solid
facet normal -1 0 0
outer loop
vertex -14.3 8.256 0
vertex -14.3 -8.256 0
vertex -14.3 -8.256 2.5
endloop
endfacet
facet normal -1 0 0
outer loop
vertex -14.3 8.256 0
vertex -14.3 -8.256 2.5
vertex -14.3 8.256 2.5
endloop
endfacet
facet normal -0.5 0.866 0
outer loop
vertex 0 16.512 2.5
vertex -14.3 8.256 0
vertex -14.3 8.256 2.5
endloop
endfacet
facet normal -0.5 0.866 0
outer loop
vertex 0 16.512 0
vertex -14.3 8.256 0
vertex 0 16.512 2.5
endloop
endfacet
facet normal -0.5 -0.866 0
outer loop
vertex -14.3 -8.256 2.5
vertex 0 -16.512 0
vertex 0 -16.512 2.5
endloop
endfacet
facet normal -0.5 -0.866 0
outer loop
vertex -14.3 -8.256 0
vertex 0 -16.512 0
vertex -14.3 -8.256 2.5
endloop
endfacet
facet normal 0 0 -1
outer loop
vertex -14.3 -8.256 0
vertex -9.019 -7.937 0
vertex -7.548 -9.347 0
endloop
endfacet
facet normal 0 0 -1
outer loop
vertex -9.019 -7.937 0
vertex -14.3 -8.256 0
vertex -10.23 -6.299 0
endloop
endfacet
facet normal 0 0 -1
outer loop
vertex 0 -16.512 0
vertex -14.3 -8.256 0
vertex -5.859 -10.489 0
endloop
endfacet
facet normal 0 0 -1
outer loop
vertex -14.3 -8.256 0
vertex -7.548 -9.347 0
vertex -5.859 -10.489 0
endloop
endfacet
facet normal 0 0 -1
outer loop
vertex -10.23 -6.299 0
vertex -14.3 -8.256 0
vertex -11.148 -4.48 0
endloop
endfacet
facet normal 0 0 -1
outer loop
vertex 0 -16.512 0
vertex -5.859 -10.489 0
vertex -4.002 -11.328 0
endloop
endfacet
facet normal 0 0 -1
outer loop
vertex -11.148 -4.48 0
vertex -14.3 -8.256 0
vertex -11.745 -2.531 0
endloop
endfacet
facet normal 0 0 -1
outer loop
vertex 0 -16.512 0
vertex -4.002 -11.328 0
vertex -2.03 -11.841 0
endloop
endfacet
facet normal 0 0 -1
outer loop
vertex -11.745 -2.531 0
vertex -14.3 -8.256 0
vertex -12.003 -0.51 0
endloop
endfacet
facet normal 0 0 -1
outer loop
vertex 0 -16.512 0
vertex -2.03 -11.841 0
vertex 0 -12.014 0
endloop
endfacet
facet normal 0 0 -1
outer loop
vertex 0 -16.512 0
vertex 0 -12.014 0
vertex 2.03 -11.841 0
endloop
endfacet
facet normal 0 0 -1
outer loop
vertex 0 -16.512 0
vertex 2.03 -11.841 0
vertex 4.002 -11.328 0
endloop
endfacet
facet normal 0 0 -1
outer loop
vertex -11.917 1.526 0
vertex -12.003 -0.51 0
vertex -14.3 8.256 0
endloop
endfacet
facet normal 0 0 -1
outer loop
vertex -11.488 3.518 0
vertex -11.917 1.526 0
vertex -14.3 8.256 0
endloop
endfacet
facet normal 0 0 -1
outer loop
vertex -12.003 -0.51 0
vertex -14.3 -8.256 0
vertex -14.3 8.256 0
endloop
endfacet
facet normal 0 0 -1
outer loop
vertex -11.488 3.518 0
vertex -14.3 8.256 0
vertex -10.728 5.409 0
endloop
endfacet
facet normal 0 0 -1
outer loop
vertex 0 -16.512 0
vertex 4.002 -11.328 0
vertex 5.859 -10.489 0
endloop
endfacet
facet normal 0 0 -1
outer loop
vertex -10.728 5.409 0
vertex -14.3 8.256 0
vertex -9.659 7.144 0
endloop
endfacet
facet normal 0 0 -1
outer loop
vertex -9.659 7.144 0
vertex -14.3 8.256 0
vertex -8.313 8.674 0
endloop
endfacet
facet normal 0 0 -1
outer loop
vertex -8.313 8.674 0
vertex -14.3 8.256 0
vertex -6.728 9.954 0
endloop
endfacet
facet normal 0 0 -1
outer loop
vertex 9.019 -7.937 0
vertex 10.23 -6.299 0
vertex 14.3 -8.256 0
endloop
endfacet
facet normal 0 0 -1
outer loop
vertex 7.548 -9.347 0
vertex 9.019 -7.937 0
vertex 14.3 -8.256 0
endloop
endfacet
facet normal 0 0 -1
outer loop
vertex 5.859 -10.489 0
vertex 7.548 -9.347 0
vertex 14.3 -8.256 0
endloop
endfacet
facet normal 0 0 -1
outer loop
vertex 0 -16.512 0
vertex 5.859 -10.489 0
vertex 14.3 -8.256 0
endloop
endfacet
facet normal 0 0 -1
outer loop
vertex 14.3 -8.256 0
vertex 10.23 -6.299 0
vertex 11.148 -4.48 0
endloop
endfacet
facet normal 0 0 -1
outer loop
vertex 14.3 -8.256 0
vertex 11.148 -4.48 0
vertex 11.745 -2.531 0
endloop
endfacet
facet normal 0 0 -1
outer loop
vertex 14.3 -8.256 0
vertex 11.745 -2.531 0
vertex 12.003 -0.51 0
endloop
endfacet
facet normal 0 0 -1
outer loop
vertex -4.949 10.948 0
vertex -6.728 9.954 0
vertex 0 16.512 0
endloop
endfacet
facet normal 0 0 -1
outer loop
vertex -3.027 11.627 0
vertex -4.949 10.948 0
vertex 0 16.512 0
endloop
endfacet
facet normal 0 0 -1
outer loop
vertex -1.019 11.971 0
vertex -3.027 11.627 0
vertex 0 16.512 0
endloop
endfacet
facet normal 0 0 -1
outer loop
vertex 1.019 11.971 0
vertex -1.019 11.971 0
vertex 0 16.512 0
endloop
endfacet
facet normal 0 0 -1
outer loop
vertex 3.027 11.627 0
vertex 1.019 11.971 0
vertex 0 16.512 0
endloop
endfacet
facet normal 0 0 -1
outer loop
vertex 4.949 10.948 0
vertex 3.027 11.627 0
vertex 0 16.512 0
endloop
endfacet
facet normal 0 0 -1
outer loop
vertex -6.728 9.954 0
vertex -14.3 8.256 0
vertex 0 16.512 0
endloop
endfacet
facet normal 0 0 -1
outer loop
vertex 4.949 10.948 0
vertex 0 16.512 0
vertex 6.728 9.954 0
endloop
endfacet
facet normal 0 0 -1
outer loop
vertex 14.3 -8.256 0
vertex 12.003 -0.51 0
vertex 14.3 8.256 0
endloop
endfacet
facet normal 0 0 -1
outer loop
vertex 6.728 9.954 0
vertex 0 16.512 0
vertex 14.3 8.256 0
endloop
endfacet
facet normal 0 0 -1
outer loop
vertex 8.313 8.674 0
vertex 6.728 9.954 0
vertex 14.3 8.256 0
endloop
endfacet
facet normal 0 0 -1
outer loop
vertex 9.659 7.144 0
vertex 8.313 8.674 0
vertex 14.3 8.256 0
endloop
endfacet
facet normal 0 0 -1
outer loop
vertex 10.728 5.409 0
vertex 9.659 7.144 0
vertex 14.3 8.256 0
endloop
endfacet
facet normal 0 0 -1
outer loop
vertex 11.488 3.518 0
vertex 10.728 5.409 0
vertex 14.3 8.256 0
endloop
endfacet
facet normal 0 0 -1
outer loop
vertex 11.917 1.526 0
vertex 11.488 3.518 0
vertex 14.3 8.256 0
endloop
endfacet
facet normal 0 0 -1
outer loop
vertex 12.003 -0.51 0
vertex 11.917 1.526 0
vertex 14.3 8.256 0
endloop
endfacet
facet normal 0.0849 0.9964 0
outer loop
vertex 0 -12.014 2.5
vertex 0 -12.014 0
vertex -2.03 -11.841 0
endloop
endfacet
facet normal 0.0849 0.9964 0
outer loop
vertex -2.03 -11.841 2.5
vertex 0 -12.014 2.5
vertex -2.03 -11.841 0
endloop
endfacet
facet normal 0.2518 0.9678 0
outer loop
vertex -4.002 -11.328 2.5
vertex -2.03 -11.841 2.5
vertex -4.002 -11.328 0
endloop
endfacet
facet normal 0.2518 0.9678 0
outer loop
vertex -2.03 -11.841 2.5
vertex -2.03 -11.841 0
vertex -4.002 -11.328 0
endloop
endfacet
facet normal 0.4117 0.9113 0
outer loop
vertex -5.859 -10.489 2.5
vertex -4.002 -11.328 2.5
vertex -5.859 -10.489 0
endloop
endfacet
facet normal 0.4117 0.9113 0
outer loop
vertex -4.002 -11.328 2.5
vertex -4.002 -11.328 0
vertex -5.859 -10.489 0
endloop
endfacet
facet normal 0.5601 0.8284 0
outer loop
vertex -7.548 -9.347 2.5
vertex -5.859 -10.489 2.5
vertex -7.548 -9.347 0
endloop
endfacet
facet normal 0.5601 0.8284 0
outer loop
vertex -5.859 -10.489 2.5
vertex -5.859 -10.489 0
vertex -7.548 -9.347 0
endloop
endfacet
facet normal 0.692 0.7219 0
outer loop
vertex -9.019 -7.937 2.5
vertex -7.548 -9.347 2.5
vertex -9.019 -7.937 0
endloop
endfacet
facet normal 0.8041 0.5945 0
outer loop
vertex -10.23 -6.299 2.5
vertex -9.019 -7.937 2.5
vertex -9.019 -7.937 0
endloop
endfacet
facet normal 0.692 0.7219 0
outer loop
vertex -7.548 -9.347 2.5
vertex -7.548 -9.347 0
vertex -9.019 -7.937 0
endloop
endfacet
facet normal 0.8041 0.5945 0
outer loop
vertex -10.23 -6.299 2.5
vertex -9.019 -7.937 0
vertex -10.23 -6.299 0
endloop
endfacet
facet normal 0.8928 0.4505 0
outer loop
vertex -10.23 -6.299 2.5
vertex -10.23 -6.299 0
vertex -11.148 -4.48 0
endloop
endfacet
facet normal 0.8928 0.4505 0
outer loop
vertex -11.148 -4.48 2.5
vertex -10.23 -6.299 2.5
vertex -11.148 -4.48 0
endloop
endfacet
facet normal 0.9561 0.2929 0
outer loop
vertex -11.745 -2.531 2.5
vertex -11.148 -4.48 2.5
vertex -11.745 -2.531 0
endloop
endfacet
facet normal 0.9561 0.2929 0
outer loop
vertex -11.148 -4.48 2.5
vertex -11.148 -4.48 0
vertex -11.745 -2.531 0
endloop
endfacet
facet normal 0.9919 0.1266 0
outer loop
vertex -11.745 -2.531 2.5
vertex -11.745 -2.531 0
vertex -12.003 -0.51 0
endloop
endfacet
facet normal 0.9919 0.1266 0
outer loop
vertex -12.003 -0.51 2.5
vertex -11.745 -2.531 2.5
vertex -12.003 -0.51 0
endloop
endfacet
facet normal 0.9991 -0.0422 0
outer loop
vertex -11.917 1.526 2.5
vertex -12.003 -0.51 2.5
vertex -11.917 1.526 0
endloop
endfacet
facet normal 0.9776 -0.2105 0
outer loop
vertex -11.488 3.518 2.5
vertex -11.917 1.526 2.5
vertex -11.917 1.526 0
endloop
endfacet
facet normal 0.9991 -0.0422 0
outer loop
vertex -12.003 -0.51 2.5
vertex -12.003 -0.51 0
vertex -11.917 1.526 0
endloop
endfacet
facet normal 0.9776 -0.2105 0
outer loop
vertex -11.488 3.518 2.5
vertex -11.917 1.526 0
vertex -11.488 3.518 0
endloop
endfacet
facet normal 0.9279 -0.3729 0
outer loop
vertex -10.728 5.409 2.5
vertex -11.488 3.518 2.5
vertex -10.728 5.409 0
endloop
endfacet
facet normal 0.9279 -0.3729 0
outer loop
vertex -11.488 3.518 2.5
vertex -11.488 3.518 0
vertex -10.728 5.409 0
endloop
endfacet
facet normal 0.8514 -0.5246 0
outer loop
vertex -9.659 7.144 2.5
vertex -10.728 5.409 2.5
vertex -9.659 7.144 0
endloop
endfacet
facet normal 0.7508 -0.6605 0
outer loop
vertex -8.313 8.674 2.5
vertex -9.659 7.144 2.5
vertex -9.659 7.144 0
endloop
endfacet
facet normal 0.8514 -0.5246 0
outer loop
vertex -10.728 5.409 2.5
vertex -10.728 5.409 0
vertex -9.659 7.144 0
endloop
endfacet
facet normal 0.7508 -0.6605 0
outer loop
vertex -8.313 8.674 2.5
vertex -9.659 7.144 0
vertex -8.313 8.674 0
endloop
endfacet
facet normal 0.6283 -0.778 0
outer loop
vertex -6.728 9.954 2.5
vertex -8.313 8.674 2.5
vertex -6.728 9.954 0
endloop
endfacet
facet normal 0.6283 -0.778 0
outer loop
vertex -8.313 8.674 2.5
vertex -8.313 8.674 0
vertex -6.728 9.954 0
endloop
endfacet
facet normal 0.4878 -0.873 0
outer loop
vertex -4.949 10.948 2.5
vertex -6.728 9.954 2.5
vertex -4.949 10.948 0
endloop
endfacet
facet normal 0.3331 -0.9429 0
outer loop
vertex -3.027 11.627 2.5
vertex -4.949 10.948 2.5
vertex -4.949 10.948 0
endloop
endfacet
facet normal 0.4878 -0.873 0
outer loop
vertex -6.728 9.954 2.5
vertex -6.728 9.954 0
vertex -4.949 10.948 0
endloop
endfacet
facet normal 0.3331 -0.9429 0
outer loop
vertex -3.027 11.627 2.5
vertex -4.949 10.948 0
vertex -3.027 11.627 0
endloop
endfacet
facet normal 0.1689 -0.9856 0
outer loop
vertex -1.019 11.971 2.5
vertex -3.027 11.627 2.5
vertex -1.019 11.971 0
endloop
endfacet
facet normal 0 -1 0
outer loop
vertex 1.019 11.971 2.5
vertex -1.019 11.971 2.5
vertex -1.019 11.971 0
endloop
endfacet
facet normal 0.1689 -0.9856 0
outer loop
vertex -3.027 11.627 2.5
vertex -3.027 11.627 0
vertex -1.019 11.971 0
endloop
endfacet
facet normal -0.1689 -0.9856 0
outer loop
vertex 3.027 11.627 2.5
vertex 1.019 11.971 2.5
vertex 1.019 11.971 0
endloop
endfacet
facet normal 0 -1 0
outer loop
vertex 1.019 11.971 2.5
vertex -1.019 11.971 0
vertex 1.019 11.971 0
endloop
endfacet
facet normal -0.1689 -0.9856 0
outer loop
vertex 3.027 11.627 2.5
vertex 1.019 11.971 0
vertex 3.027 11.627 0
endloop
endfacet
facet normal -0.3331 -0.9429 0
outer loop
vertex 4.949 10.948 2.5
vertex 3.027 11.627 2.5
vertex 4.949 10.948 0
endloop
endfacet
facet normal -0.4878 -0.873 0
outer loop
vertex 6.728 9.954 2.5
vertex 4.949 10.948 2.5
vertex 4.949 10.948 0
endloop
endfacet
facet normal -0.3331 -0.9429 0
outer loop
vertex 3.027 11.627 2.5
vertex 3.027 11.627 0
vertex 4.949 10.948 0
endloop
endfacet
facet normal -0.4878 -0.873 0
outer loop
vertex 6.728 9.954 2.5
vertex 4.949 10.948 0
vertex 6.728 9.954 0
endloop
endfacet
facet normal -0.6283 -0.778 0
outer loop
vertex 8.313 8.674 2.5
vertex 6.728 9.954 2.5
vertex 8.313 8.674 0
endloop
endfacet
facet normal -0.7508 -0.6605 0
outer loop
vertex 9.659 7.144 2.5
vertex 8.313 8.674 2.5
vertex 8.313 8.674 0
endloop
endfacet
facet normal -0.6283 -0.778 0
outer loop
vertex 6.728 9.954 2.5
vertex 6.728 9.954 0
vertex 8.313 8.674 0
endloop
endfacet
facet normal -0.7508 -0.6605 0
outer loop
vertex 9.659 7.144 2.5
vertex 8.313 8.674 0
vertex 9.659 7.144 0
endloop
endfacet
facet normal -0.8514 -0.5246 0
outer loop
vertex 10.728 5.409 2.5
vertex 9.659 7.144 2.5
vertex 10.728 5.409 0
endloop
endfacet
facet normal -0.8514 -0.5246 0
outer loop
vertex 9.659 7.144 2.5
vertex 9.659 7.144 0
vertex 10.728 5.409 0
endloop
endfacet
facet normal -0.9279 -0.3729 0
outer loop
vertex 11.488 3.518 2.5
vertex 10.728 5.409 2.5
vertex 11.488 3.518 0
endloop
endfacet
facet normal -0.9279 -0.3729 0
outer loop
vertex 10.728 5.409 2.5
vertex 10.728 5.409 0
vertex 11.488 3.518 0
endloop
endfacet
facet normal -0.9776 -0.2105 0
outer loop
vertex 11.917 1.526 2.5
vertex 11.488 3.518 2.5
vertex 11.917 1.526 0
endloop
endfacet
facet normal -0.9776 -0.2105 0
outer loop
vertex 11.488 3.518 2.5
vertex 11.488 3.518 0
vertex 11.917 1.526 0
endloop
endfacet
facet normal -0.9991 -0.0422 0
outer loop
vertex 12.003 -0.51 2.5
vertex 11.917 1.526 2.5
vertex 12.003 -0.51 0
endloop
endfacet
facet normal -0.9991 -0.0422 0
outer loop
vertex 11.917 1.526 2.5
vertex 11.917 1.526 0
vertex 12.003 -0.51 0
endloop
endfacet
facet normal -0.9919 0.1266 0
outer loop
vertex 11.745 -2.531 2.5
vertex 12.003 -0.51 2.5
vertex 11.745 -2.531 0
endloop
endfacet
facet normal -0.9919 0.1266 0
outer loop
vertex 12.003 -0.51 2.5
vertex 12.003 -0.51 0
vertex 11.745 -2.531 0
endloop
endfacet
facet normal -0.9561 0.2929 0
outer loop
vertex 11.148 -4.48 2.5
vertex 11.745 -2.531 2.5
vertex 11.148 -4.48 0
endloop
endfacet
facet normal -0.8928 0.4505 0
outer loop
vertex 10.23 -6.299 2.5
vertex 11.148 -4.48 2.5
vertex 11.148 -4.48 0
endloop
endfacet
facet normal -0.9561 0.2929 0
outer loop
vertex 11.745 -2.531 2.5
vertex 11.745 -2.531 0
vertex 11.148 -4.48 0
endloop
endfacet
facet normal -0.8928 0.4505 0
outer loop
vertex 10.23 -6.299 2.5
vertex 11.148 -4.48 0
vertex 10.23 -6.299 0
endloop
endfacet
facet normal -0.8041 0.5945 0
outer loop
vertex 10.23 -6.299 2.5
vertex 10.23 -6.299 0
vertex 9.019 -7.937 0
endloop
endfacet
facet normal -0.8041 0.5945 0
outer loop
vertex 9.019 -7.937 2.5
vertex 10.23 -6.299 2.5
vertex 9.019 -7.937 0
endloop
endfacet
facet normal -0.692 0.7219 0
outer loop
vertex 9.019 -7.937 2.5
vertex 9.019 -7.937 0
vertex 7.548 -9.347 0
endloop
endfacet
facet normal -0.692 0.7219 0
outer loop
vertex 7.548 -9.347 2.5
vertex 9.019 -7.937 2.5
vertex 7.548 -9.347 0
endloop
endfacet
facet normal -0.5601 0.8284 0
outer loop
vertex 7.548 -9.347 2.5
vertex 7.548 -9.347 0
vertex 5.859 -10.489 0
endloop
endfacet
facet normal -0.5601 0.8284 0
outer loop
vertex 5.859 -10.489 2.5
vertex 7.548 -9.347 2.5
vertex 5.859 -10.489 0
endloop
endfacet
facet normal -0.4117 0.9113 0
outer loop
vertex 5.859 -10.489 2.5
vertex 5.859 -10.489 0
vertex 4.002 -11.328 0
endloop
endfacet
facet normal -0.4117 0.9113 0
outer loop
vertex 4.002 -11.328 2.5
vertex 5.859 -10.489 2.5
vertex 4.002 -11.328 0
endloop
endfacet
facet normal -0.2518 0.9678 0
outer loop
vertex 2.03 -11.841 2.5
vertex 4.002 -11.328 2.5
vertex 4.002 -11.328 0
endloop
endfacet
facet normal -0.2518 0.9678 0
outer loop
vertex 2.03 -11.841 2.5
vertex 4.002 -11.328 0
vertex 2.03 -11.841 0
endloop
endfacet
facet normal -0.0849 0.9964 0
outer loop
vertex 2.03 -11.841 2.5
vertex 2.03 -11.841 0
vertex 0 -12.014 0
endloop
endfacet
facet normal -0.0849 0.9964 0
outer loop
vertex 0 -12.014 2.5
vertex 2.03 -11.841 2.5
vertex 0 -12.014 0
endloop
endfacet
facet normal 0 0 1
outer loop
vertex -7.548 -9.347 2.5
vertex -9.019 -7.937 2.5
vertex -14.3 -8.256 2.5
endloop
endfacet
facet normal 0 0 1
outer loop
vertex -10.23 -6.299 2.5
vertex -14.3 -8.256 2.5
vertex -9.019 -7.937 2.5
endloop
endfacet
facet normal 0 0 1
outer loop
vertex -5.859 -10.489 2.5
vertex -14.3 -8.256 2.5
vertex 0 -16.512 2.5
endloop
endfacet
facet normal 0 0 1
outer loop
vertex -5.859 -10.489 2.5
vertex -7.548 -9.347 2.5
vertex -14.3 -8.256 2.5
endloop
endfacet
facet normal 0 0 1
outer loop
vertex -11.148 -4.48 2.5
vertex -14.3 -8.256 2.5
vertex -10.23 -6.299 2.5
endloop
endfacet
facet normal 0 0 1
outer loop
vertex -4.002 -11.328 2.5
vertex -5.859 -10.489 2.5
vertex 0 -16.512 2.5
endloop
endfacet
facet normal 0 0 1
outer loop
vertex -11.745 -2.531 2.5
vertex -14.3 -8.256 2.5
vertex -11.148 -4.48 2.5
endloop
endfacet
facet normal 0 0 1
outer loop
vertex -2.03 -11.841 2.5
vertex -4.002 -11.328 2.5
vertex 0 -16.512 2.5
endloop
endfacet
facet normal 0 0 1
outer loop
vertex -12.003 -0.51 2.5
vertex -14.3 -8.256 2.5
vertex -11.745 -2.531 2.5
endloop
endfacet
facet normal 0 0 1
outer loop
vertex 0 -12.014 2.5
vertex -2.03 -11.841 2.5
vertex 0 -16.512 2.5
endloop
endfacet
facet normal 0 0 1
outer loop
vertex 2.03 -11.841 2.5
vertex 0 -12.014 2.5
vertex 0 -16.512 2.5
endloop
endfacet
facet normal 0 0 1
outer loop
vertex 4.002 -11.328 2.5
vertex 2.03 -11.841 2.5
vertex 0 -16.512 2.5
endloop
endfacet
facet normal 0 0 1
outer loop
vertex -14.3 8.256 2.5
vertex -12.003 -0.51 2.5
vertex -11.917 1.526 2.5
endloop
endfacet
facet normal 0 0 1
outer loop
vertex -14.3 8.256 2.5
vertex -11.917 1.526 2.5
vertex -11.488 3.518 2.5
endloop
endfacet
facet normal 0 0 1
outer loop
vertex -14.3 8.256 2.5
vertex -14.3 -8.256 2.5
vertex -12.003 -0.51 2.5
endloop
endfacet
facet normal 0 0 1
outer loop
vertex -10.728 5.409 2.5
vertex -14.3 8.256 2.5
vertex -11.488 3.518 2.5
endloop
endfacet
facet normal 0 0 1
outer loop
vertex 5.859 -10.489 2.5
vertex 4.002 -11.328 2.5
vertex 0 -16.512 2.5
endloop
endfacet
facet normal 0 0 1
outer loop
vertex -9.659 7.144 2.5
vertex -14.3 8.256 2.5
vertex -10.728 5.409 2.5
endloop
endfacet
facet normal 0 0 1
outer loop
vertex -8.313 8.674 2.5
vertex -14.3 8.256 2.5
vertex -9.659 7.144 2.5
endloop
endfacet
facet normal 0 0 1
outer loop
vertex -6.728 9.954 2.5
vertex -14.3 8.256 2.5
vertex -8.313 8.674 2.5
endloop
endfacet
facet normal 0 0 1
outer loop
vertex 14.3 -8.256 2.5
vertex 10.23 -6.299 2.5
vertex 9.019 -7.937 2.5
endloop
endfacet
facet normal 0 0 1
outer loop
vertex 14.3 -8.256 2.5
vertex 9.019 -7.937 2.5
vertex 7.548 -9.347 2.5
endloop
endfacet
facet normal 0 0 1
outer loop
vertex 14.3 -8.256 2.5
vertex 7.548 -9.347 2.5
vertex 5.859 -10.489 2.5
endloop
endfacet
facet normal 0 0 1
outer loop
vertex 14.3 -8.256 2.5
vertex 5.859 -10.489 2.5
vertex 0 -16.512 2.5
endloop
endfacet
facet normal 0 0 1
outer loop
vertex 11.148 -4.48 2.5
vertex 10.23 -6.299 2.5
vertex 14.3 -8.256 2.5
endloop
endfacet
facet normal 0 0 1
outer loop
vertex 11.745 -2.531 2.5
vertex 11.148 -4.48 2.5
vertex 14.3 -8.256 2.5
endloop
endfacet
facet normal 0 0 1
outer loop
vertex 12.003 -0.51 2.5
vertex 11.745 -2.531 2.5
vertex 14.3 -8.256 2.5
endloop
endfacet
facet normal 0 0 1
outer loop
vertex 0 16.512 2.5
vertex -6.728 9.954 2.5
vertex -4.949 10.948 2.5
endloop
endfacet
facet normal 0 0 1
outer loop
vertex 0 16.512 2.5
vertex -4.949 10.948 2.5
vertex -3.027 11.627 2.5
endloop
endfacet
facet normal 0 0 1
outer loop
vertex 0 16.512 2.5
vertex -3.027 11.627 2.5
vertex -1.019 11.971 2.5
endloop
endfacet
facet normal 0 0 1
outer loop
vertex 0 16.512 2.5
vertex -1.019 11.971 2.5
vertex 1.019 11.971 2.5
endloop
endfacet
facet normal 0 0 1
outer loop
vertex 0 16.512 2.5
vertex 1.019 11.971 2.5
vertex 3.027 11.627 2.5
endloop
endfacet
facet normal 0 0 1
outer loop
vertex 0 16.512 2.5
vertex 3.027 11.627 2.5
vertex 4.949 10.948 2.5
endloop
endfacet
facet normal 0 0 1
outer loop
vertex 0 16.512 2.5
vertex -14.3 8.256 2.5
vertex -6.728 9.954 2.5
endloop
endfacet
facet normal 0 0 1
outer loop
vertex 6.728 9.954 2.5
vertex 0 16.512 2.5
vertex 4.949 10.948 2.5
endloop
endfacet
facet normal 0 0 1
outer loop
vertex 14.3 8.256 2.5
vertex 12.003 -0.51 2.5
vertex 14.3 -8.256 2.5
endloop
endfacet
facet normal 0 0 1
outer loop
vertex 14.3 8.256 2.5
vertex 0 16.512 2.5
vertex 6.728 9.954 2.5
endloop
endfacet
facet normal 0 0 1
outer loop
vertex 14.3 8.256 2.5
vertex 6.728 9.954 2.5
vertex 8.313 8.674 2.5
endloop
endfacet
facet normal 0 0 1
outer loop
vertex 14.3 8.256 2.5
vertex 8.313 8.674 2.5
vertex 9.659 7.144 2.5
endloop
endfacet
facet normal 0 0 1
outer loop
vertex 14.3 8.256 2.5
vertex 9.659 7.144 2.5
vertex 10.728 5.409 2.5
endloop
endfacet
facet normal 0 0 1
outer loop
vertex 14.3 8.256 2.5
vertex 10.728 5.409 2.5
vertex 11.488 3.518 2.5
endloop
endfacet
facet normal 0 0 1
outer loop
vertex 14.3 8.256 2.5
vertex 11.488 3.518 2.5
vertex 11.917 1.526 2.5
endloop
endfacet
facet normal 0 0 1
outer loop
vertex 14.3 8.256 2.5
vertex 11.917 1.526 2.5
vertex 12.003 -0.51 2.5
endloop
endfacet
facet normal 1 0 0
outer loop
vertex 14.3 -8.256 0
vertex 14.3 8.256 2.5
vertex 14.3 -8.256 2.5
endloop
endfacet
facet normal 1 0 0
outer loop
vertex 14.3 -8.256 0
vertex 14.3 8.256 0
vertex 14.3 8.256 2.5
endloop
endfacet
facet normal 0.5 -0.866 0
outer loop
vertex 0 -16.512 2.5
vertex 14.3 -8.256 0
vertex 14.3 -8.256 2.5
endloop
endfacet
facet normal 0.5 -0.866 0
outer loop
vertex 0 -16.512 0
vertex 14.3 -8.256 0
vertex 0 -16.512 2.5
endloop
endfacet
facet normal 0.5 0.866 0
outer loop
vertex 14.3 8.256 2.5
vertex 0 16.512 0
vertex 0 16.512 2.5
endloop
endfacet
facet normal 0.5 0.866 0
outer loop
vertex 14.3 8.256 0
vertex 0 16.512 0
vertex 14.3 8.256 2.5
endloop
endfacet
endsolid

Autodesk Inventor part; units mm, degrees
ref_plane "YZ Plane" through (0, 0, 0) normal (1, 0, 0) x (0, 1, 0)
ref_plane "XZ Plane" through (0, 0, 0) normal (0, 1, 0) x (-1, 0, 0)
ref_plane "XY Plane" through (0, 0, 0) normal (0, 0, 1) x (1, 0, 0)
sketch "Sketch1" plane through (0, 0, 0) normal (0, 0, 1) x (1, 0, 0)
  line L0 (0, 16.5122) -> (14.3, 8.2561)
  line L1 (14.3, 8.2561) -> (14.3, -8.2561)
  line L2 (14.3, -8.2561) -> (0, -16.5122)
  line L3 (0, -16.5122) -> (-14.3, -8.2561)
  line L4 (-14.3, -8.2561) -> (-14.3, 8.2561)
  line L5 (-14.3, 8.2561) -> (0, 16.5122)
  point P0 (0, 0)
  point P1 (0, 0)
  dimension "d0" = 28.6
extrude "Extrusion1" add sketch "Sketch1" along normal blind 2.5
sketch "Sketch2" plane through (0, 0, 2.5) normal (0, 0, 1) x (1, 0, 0)
  point P0 (0, 0)
hole "Hole1" at (0, 0, 2.5) direction (0, 0, -1) diameter 24.0284 end through all thread size "1-20 UNEF" class "2B" standard "ANSI Unified Screw Threads"
properties part number "USB NUT"
